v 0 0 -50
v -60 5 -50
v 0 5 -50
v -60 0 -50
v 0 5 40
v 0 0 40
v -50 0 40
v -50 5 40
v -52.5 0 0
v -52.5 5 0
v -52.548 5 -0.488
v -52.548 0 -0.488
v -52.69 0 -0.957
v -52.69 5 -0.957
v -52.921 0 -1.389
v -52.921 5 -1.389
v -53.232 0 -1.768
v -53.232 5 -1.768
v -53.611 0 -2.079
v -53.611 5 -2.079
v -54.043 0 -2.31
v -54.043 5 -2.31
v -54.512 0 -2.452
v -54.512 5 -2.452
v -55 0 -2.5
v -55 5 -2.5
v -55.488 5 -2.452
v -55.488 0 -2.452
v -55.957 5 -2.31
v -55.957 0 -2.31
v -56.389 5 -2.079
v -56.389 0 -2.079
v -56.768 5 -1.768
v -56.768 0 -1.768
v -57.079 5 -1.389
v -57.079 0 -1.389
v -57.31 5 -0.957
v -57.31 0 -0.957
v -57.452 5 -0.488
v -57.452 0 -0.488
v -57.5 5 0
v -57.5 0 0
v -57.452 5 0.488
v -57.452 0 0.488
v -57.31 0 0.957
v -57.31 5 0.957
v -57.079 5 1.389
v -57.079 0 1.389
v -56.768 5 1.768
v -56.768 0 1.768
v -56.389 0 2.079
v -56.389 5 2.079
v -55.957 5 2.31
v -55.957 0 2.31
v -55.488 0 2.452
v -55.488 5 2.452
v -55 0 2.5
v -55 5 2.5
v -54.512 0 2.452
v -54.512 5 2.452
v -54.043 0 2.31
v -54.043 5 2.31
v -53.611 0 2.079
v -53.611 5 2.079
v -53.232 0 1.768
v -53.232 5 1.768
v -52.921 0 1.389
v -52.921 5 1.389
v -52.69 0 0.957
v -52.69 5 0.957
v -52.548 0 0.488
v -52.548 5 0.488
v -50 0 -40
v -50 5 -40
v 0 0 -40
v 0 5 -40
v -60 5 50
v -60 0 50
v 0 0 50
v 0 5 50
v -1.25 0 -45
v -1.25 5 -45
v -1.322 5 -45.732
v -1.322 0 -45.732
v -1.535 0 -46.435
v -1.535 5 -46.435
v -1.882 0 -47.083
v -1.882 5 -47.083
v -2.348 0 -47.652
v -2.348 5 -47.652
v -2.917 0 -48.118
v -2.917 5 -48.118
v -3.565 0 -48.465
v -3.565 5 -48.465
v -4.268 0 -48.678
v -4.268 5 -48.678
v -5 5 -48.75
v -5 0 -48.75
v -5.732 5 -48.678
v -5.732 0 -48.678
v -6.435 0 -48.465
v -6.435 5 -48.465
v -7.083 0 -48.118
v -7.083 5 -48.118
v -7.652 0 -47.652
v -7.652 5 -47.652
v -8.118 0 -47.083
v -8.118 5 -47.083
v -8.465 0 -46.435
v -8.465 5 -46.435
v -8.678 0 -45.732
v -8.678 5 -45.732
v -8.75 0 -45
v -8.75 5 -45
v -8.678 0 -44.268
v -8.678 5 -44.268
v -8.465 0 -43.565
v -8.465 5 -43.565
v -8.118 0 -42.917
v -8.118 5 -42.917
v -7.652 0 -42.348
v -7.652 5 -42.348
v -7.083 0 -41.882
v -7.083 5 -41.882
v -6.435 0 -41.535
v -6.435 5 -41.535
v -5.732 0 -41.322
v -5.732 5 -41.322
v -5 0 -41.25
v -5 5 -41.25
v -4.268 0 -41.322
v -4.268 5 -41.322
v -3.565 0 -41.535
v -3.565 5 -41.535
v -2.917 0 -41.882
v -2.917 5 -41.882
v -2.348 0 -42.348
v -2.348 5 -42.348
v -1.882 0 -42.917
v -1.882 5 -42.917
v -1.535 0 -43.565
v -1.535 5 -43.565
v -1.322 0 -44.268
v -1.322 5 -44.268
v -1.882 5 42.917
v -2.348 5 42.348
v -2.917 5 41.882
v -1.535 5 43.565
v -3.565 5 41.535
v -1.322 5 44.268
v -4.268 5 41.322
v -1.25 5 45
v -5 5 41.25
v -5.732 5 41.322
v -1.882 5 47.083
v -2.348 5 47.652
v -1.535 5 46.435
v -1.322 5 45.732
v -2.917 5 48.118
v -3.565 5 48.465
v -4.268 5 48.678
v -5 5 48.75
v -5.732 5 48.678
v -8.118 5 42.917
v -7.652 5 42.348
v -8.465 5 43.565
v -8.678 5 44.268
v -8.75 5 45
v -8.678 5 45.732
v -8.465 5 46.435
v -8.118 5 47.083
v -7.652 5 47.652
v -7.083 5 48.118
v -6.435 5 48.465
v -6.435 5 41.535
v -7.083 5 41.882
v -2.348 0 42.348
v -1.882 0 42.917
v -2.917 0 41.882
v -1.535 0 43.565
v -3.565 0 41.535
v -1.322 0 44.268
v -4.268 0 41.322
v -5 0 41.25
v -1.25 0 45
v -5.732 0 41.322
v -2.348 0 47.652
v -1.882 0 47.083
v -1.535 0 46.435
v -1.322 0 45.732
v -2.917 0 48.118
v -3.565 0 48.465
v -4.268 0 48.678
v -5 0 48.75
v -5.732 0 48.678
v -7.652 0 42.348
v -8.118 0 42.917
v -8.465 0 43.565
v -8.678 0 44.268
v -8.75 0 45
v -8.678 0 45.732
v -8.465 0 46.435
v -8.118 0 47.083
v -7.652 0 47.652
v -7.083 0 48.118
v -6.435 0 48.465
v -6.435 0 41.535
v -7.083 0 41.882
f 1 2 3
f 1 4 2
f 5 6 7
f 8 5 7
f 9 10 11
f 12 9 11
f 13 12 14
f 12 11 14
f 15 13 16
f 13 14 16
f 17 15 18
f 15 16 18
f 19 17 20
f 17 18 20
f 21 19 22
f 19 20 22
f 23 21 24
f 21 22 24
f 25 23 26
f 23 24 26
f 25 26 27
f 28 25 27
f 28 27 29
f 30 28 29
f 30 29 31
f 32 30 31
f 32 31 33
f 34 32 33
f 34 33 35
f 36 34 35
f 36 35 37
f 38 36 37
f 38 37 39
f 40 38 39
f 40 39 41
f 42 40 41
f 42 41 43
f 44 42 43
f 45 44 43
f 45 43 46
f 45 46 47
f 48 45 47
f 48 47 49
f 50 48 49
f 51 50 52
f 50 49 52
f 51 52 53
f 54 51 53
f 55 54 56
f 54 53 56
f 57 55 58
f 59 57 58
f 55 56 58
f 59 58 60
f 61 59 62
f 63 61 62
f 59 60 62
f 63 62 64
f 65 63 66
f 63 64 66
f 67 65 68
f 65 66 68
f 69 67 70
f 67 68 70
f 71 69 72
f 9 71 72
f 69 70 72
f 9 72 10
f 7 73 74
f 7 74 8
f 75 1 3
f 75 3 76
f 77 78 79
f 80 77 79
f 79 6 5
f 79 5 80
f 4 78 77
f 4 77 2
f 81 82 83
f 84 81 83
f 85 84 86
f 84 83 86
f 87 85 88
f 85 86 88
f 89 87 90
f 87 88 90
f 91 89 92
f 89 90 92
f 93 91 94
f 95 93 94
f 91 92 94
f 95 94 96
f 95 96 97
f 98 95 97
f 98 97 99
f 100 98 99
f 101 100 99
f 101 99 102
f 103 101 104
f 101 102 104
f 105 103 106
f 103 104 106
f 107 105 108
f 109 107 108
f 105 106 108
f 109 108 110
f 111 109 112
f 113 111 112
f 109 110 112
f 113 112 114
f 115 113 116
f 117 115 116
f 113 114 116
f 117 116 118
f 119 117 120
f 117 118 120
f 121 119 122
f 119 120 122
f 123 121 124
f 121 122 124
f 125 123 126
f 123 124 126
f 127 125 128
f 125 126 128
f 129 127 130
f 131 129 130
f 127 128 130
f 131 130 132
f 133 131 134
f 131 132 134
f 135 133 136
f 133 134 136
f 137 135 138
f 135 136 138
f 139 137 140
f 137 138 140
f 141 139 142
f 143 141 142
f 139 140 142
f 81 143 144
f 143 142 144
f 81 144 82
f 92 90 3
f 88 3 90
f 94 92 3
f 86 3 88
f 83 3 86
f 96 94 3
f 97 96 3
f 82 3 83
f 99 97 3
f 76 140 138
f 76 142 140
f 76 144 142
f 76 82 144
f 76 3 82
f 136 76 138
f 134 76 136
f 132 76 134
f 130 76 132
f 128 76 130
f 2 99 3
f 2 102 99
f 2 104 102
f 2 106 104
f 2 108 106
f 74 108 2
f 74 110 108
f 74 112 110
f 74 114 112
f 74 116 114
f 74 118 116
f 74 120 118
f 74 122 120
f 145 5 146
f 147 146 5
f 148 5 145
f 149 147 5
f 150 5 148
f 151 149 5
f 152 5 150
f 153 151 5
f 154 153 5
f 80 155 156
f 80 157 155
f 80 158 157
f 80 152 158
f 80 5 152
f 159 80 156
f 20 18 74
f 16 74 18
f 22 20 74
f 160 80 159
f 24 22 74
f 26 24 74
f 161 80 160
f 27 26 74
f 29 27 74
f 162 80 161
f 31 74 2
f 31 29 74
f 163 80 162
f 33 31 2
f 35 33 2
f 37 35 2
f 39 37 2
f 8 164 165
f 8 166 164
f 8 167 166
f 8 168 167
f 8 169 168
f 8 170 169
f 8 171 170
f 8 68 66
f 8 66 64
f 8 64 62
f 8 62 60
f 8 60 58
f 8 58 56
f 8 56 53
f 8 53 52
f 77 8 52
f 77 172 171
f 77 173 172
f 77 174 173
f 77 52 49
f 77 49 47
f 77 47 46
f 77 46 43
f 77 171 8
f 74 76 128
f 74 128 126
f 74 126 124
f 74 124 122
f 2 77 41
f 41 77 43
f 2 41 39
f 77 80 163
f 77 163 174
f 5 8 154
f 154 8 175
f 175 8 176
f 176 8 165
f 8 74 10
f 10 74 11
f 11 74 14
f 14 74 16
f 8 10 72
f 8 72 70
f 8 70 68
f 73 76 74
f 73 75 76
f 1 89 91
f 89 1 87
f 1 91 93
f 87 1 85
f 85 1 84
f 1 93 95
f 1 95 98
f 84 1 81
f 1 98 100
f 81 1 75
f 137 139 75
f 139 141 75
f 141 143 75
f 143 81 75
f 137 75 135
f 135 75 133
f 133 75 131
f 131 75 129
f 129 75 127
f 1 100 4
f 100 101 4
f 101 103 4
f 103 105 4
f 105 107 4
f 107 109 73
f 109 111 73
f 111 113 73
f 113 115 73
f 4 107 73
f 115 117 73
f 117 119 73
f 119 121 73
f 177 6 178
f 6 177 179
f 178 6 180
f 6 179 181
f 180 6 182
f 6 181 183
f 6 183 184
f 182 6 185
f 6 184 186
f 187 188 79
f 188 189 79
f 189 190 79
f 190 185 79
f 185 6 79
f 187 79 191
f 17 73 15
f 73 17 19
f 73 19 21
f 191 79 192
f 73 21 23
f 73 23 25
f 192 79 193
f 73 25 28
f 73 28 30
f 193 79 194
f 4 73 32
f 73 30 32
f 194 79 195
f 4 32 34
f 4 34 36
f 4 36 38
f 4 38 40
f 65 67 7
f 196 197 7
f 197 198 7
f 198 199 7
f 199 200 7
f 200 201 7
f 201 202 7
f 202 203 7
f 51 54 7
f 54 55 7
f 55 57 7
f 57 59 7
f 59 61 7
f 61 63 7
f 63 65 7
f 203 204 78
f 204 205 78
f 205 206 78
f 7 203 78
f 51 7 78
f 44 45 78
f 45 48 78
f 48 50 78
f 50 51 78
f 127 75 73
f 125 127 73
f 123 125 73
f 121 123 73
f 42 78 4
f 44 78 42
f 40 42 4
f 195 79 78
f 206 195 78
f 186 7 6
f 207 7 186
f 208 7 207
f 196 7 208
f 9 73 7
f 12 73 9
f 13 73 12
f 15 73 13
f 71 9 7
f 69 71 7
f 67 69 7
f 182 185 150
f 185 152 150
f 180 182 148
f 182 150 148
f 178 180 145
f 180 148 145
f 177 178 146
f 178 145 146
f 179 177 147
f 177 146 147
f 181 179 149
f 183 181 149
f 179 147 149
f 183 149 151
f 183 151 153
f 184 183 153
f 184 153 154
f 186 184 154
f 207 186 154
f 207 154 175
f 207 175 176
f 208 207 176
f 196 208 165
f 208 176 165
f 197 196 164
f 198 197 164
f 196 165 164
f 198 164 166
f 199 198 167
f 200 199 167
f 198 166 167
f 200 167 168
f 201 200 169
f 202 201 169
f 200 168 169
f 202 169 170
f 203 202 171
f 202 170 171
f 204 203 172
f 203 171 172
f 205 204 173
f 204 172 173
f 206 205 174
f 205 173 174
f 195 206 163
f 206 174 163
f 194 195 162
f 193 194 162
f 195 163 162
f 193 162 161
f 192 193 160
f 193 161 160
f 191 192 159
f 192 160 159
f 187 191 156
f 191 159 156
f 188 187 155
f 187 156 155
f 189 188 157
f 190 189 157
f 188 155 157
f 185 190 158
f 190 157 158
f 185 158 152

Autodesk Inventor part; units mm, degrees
ref_plane "YZ Plane" through (0, 0, 0) normal (1, 0, 0) x (0, 1, 0)
ref_plane "XZ Plane" through (0, 0, 0) normal (0, 1, 0) x (-1, 0, 0)
ref_plane "XY Plane" through (0, 0, 0) normal (0, 0, 1) x (1, 0, 0)
sketch "スケッチ1" plane through (0, 0, 0) normal (0, 1, 0) x (-1, 0, 0)
  line L0 (72, 0) -> (-12, 0) projected
  line L1 (0, -70) -> (0, 70) projected
  line L2 (60, 0) -> (60, -50)
  line L3 (60, -50) -> (0, -50)
  line L4 (0, -40) -> (50, -40)
  line L5 (50, -40) -> (50, 0)
  line L6 (60, 0) -> (60, 50)
  line L7 (60, 50) -> (0, 50)
  line L8 (0, 40) -> (50, 40)
  line L9 (50, 40) -> (50, 0)
  line L10 (0, 50) -> (0, 40)
  line L11 (0, -40) -> (0, -50)
  point P0 (0, 0)
  dimension "d0" = 10
  dimension "d1" = 50
  dimension "d2" = 50
  dimension "d4" = 10
  dimension "d5" = 50
extrude "押し出し1" add sketch "スケッチ1" along normal blind 5 contours L2 L3 L1 L4 L5 L0 | L0 L9 L8 L1 L7 L6
sketch "スケッチ2" plane through (0, 5, 0) normal (0, 1, 0) x (1, 0, 0)
  circle A0 centre (-5, -45) radius 3.75
  line L0 (0, -50) -> (0, -40) projected
  line L1 (-60, -50) -> (0, -50) projected
  line L2 (-72, 0) -> (12, 0) projected
  circle A1 centre (-5, 45) radius 3.75
  circle A2 centre (-55, 0) radius 2.5
  line L3 (-50, -40) -> (-50, 40) projected
  point P0 (0, 0)
  dimension "d8" = 7.5
  dimension "d9" = 5
  dimension "d10" = 5
  dimension "d11" = 5
  dimension "d12" = 5
extrude "押し出し2" cut sketch "スケッチ2" against normal blind 5
properties part number "bogie" material "アルミニウム 6061"
